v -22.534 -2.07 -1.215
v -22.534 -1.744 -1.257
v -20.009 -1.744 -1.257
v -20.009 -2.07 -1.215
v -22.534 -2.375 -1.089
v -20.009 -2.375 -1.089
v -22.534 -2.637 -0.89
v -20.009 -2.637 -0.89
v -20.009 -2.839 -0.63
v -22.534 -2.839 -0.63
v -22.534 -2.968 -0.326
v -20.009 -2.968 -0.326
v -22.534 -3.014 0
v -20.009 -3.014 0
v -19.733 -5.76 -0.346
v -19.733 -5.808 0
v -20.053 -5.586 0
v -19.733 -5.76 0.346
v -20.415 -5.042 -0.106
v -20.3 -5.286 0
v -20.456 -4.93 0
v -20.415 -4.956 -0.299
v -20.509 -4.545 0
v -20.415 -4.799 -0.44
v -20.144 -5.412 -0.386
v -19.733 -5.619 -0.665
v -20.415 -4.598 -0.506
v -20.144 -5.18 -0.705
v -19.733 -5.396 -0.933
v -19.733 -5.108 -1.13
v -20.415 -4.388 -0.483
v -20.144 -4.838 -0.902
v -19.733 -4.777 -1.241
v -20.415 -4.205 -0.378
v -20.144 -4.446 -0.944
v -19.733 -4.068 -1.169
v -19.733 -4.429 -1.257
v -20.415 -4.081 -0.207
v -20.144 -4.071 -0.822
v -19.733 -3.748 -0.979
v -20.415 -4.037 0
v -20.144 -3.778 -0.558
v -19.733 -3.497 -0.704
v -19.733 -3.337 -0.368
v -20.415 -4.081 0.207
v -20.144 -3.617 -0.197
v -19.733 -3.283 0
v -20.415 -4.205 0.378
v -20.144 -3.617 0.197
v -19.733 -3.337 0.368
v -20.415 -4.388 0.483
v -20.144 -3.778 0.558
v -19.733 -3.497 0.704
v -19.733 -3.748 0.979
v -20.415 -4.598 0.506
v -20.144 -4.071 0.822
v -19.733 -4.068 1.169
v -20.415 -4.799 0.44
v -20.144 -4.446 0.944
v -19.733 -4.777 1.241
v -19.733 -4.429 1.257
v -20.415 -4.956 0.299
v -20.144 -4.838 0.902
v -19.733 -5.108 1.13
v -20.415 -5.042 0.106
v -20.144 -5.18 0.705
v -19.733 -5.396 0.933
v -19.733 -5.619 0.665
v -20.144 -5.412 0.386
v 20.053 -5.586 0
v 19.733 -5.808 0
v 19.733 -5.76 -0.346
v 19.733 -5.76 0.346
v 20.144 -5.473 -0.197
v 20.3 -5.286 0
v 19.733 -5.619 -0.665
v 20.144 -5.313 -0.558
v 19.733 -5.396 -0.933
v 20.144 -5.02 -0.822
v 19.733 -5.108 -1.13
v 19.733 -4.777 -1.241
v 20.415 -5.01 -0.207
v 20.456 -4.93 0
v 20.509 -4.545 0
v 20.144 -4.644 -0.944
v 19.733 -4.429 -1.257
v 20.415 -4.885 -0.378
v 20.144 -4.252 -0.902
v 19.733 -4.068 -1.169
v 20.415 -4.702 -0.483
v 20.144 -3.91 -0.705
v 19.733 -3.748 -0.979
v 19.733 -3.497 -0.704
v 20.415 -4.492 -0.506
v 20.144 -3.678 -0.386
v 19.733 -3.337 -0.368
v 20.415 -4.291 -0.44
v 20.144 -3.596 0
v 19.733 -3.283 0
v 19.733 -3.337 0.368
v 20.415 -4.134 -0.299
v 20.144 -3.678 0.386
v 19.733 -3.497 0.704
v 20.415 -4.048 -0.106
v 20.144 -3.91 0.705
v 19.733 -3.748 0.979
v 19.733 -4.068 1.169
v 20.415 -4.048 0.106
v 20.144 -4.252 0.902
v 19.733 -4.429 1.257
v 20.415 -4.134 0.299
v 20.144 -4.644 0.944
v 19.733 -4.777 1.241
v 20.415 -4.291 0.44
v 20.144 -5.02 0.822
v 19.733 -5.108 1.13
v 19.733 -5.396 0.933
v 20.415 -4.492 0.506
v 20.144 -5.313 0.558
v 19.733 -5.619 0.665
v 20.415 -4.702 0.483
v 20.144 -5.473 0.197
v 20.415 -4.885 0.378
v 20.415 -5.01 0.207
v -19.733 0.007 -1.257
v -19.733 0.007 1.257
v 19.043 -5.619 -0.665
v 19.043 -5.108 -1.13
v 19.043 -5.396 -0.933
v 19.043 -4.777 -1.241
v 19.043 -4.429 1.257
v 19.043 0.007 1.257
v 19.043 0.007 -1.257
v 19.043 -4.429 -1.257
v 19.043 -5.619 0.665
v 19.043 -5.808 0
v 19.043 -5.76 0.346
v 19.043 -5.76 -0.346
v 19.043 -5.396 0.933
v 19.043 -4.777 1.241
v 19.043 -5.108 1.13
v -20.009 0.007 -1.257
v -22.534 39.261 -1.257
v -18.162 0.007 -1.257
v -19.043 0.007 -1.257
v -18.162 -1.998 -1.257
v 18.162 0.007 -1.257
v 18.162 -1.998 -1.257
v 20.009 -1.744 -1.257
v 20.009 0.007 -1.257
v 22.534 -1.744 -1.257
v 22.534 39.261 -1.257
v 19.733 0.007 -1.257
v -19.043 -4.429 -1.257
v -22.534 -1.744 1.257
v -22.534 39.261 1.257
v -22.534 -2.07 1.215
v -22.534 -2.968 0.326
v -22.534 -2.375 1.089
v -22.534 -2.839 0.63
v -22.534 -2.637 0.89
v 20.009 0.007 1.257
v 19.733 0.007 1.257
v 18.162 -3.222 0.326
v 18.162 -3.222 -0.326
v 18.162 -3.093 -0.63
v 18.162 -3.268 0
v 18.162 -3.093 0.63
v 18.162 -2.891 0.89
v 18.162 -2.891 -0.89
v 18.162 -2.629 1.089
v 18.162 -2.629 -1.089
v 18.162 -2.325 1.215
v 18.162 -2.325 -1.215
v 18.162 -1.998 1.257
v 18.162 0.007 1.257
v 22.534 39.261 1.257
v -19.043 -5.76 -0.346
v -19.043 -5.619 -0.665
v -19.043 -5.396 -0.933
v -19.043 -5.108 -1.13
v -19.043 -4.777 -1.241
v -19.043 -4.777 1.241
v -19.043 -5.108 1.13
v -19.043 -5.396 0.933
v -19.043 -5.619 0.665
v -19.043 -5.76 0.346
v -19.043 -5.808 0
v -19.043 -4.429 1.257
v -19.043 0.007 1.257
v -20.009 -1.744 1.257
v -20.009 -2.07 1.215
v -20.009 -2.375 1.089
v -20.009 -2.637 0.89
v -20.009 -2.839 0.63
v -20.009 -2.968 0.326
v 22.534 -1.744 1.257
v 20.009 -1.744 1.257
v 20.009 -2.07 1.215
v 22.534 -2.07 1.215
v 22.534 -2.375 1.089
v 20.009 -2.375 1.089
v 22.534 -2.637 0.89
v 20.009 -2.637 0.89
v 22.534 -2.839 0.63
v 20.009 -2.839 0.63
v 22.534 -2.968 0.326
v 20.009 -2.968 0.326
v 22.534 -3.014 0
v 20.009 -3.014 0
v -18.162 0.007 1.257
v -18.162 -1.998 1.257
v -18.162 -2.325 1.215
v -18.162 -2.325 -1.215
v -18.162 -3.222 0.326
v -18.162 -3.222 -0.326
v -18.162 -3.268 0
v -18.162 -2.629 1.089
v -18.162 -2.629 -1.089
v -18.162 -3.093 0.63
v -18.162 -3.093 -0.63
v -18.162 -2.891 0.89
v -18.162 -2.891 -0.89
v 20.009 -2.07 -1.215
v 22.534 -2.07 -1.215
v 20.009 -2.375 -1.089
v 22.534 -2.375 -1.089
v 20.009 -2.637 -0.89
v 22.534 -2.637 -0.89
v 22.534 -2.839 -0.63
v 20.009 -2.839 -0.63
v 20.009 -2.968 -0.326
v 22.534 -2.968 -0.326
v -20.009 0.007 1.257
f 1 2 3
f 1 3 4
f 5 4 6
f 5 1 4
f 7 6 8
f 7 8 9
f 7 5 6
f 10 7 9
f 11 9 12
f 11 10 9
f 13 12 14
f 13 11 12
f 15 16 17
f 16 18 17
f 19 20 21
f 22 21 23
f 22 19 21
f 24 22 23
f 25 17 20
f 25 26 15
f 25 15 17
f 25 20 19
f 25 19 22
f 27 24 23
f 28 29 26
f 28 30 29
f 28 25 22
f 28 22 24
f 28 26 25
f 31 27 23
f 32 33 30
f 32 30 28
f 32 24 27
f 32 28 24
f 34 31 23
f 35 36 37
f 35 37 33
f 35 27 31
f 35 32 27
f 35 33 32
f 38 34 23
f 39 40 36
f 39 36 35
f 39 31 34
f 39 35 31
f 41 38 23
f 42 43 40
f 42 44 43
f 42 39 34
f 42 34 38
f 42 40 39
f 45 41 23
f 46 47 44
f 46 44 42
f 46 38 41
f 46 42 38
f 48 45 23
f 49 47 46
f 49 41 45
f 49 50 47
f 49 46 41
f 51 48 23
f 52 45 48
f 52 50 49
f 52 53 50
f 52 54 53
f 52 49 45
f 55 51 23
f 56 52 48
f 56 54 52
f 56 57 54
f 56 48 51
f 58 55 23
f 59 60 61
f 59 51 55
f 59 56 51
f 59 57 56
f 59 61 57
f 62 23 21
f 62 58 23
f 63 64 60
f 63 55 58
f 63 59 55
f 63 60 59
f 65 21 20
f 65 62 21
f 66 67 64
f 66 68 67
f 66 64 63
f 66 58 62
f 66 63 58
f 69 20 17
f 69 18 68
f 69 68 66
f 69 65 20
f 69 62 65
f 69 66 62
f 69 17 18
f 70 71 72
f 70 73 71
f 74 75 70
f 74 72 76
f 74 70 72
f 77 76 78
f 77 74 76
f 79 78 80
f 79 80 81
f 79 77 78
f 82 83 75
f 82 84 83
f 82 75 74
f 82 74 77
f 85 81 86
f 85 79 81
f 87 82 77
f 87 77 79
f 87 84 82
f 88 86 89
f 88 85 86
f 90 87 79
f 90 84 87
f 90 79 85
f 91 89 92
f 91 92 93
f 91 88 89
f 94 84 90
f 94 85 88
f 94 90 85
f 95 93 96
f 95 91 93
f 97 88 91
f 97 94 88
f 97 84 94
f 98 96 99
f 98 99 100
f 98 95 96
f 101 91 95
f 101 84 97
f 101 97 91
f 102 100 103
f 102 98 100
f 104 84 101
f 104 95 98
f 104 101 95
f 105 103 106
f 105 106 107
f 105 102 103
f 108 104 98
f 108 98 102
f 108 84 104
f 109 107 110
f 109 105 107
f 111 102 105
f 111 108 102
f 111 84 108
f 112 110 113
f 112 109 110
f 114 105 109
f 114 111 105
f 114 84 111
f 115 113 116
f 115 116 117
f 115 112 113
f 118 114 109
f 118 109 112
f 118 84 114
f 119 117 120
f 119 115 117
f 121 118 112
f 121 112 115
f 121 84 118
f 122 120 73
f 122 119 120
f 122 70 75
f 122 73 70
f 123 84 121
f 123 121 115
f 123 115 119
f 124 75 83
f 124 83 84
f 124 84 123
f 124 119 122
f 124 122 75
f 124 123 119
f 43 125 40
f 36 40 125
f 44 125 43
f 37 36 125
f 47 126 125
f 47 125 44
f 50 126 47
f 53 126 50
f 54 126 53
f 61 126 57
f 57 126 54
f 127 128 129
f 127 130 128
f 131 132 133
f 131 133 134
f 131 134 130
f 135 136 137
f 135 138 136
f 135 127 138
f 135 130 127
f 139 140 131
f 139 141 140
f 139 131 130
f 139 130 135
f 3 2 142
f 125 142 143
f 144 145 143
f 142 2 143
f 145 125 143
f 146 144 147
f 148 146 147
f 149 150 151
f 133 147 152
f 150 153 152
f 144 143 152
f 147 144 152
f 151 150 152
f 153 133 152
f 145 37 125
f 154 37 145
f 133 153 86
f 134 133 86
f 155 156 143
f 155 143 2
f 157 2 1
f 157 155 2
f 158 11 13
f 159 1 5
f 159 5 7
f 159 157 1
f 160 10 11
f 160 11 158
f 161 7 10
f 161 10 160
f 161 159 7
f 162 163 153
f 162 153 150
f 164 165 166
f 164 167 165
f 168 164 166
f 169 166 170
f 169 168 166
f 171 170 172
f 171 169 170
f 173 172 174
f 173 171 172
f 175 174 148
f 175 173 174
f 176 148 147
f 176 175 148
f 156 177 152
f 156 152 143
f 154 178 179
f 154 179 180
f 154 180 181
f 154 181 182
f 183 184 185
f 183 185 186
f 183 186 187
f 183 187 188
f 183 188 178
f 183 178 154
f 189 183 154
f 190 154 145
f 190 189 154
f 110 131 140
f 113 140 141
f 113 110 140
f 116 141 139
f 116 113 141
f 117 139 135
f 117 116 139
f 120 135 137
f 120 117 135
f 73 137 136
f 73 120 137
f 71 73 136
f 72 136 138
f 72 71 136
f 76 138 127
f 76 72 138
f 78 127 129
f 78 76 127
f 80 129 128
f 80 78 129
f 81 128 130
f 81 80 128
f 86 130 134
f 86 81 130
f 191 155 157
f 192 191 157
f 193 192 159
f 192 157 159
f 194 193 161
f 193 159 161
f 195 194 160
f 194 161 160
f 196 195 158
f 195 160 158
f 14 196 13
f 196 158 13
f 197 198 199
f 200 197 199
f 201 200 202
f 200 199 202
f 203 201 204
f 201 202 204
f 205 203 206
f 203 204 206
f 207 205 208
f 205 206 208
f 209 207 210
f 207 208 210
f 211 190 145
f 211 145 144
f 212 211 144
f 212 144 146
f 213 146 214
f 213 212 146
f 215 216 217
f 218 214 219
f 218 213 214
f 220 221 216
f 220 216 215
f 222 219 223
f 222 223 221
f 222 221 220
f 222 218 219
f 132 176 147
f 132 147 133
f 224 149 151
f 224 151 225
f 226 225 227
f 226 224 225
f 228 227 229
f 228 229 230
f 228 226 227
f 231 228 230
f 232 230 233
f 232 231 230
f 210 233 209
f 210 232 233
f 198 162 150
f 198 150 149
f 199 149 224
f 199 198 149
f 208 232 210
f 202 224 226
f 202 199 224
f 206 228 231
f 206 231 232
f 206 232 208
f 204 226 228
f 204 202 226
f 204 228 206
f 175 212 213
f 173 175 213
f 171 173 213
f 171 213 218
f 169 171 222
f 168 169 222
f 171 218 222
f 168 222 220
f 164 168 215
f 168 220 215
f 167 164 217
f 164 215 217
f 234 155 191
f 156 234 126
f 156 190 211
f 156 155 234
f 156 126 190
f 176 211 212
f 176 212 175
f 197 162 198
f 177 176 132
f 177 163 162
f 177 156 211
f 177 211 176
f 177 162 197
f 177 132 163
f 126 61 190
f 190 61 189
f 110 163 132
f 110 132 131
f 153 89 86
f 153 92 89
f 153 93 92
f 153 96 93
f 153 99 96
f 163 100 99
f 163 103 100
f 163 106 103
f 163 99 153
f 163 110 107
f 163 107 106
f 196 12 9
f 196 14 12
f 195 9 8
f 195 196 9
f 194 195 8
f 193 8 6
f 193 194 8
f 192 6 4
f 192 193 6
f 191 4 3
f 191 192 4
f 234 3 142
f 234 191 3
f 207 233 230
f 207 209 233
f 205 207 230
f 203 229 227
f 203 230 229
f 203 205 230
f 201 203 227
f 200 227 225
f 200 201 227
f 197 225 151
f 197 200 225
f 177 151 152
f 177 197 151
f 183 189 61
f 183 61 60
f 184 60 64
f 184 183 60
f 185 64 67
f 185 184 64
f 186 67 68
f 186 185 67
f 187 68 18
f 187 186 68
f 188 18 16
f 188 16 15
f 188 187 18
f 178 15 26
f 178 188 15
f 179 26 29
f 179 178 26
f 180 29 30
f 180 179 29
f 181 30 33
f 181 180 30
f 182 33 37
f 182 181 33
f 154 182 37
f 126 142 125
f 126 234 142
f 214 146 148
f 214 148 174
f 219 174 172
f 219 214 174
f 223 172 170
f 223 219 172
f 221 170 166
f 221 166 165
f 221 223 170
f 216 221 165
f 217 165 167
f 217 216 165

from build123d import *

# Parameters (mm, degrees)
F0_W        = 0.6898511201
F0_H        = 1.2626703829
F0_H_2      = 3.2899174839
F2_DEPTH    = 1.2573
F3_DEPTH    = 2.54
F4_T1_DEPTH = 36.3235808909
F4_T3_DEPTH = 2.5253407657
F4_T5_DEPTH = 2.5253407657


# Not quite as in the source:
# - a fillet or chamfer that OpenCascade refuses, or shapes differently, is made with other operations: its cross-section is extruded or revolved along the edge and cut away or added
# - a feature names something its author has since deleted; it is built from what else it names


with BuildPart() as f1:
    # F0 (on Top) → F1 (revolve)
    with BuildSketch(Plane.XY):
        with BuildLine():
            Line((-19.7332594544, -5.8078670874), (-19.7332594544, -4.5451967046))
            Line((-19.7332594544, -4.5451967046), (-20.5092396879, -4.5451967046))
            ThreePointArc((-20.5092396879, -4.5451967046), (-20.2997388093, -5.2862233267), (-19.7332594544, -5.8078670874))
        make_face()
        with Locations((-19.3883338943, -5.176531896)):
            Rectangle(F0_W, F0_H)
    revolve(axis=Axis((-19.3883338943, -4.5451967046, 0), (1, 0, 0)))



with BuildPart() as f1b:
    # F0 (on Top) → F1, piece 2 (revolve)
    with BuildSketch(Plane.XY):
        with BuildLine():
            Line((20.5092396879, -4.5451967046), (19.7332594544, -4.5451967046))
            Line((19.7332594544, -4.5451967046), (19.7332594544, -5.8078670874))
            ThreePointArc((19.7332594544, -5.8078670874), (20.2997388093, -5.2862233267), (20.5092396879, -4.5451967046))
        make_face()
        with Locations((19.3883338943, -5.176531896)):
            Rectangle(F0_W, F0_H)
    revolve(axis=Axis((-19.3883338943, -4.5451967046, 0), (1, 0, 0)))


with BuildPart() as f1_1:
    add(f1.part)

    add(f1b.part)  # F2 merges F1b
    # F0 (on Top) → F2 (join, symmetric)
    with BuildSketch(Plane.XY):
        Polygon((-20.009059459, 0.0073911622), (-19.7332594544, 0.0073911622), (-19.0434083343, 0.0073911622), (-18.1617904454, 0.0073911622), (-18.1617904454, -5.8078670874), (0, -5.8078670874), (18.1617904454, -5.8078670874), (18.1617904454, 0.0073911622), (19.0434083343, 0.0073911622), (19.7332594544, 0.0073911622), (20.009059459, 0.0073911622), (20.009059459, -3.01362928), (22.5344002247, -3.01362928), (22.5344002247, 39.2609333619), (0, 39.2609333619), (-22.5344002247, 39.2609333619), (-22.5344002247, -3.01362928), (-20.009059459, -3.01362928), align=None)
        with Locations((-19.3883338943, -1.6375675797)):
            Rectangle(F0_W, F0_H_2)
        with Locations((19.3883338943, -1.6375675797)):
            Rectangle(F0_W, F0_H_2)
        with Locations((-19.3883338943, -3.9138615131)):
            Rectangle(F0_W, F0_H)
        with Locations((19.3883338943, -3.9138615131)):
            Rectangle(F0_W, F0_H)
    extrude(amount=F2_DEPTH, both=True)

    # F3 (cut): a face of the model
    f3_faces = [f1_1.faces().sort_by_distance(p)[0] for p in [
        (0, -5.8078670874, 0),
    ]]
    extrude(f3_faces, amount=-F3_DEPTH, mode=Mode.SUBTRACT)

    # F4: fillet of radius 1.27 on 6 edges, made by hand

    # F4_s2 → F4_t1 (cut)
    with BuildSketch(Plane.YZ.offset(-18.1617904454)):
        with BuildLine():
            ThreePointArc((-1.9978670874, 1.2573), (-2.8958926995, 0.8853256121), (-3.2678670874, -0.0127))
            Line((-3.2678670874, -0.0127), (-3.2932670874, -0.0127))
            Line((-3.2932670874, -0.0127), (-3.2932670874, 1.2827))
            Line((-3.2932670874, 1.2827), (-1.9978670874, 1.2827))
            Line((-1.9978670874, 1.2827), (-1.9978670874, 1.2573))
        make_face()
        with BuildLine():
            ThreePointArc((-1.9978670874, -1.2573), (-2.8958926995, -0.8853256121), (-3.2678670874, 0.0127))
            Line((-3.2678670874, 0.0127), (-3.2932670874, 0.0127))
            Line((-3.2932670874, 0.0127), (-3.2932670874, -1.2827))
            Line((-3.2932670874, -1.2827), (-1.9978670874, -1.2827))
            Line((-1.9978670874, -1.2827), (-1.9978670874, -1.2573))
        make_face()
    extrude(amount=F4_T1_DEPTH, mode=Mode.SUBTRACT)

    # F4_s4 → F4_t3 (cut)
    with BuildSketch(Plane.YZ.offset(-22.5344002247)):
        with BuildLine():
            ThreePointArc((-1.74362928, 1.2573), (-2.6416548921, 0.8853256121), (-3.01362928, -0.0127))
            Line((-3.01362928, -0.0127), (-3.03902928, -0.0127))
            Line((-3.03902928, -0.0127), (-3.03902928, 1.2827))
            Line((-3.03902928, 1.2827), (-1.74362928, 1.2827))
            Line((-1.74362928, 1.2827), (-1.74362928, 1.2573))
        make_face()
        with BuildLine():
            ThreePointArc((-1.74362928, -1.2573), (-2.6416548921, -0.8853256121), (-3.01362928, 0.0127))
            Line((-3.01362928, 0.0127), (-3.03902928, 0.0127))
            Line((-3.03902928, 0.0127), (-3.03902928, -1.2827))
            Line((-3.03902928, -1.2827), (-1.74362928, -1.2827))
            Line((-1.74362928, -1.2827), (-1.74362928, -1.2573))
        make_face()
    extrude(amount=F4_T3_DEPTH, mode=Mode.SUBTRACT)

    # F4_s6 → F4_t5 (cut)
    with BuildSketch(Plane.YZ.offset(20.009059459)):
        with BuildLine():
            ThreePointArc((-1.74362928, 1.2573), (-2.6416548921, 0.8853256121), (-3.01362928, -0.0127))
            Line((-3.01362928, -0.0127), (-3.03902928, -0.0127))
            Line((-3.03902928, -0.0127), (-3.03902928, 1.2827))
            Line((-3.03902928, 1.2827), (-1.74362928, 1.2827))
            Line((-1.74362928, 1.2827), (-1.74362928, 1.2573))
        make_face()
        with BuildLine():
            ThreePointArc((-1.74362928, -1.2573), (-2.6416548921, -0.8853256121), (-3.01362928, 0.0127))
            Line((-3.01362928, 0.0127), (-3.03902928, 0.0127))
            Line((-3.03902928, 0.0127), (-3.03902928, -1.2827))
            Line((-3.03902928, -1.2827), (-1.74362928, -1.2827))
            Line((-1.74362928, -1.2827), (-1.74362928, -1.2573))
        make_face()
    extrude(amount=F4_T5_DEPTH, mode=Mode.SUBTRACT)


solid = f1_1.part
